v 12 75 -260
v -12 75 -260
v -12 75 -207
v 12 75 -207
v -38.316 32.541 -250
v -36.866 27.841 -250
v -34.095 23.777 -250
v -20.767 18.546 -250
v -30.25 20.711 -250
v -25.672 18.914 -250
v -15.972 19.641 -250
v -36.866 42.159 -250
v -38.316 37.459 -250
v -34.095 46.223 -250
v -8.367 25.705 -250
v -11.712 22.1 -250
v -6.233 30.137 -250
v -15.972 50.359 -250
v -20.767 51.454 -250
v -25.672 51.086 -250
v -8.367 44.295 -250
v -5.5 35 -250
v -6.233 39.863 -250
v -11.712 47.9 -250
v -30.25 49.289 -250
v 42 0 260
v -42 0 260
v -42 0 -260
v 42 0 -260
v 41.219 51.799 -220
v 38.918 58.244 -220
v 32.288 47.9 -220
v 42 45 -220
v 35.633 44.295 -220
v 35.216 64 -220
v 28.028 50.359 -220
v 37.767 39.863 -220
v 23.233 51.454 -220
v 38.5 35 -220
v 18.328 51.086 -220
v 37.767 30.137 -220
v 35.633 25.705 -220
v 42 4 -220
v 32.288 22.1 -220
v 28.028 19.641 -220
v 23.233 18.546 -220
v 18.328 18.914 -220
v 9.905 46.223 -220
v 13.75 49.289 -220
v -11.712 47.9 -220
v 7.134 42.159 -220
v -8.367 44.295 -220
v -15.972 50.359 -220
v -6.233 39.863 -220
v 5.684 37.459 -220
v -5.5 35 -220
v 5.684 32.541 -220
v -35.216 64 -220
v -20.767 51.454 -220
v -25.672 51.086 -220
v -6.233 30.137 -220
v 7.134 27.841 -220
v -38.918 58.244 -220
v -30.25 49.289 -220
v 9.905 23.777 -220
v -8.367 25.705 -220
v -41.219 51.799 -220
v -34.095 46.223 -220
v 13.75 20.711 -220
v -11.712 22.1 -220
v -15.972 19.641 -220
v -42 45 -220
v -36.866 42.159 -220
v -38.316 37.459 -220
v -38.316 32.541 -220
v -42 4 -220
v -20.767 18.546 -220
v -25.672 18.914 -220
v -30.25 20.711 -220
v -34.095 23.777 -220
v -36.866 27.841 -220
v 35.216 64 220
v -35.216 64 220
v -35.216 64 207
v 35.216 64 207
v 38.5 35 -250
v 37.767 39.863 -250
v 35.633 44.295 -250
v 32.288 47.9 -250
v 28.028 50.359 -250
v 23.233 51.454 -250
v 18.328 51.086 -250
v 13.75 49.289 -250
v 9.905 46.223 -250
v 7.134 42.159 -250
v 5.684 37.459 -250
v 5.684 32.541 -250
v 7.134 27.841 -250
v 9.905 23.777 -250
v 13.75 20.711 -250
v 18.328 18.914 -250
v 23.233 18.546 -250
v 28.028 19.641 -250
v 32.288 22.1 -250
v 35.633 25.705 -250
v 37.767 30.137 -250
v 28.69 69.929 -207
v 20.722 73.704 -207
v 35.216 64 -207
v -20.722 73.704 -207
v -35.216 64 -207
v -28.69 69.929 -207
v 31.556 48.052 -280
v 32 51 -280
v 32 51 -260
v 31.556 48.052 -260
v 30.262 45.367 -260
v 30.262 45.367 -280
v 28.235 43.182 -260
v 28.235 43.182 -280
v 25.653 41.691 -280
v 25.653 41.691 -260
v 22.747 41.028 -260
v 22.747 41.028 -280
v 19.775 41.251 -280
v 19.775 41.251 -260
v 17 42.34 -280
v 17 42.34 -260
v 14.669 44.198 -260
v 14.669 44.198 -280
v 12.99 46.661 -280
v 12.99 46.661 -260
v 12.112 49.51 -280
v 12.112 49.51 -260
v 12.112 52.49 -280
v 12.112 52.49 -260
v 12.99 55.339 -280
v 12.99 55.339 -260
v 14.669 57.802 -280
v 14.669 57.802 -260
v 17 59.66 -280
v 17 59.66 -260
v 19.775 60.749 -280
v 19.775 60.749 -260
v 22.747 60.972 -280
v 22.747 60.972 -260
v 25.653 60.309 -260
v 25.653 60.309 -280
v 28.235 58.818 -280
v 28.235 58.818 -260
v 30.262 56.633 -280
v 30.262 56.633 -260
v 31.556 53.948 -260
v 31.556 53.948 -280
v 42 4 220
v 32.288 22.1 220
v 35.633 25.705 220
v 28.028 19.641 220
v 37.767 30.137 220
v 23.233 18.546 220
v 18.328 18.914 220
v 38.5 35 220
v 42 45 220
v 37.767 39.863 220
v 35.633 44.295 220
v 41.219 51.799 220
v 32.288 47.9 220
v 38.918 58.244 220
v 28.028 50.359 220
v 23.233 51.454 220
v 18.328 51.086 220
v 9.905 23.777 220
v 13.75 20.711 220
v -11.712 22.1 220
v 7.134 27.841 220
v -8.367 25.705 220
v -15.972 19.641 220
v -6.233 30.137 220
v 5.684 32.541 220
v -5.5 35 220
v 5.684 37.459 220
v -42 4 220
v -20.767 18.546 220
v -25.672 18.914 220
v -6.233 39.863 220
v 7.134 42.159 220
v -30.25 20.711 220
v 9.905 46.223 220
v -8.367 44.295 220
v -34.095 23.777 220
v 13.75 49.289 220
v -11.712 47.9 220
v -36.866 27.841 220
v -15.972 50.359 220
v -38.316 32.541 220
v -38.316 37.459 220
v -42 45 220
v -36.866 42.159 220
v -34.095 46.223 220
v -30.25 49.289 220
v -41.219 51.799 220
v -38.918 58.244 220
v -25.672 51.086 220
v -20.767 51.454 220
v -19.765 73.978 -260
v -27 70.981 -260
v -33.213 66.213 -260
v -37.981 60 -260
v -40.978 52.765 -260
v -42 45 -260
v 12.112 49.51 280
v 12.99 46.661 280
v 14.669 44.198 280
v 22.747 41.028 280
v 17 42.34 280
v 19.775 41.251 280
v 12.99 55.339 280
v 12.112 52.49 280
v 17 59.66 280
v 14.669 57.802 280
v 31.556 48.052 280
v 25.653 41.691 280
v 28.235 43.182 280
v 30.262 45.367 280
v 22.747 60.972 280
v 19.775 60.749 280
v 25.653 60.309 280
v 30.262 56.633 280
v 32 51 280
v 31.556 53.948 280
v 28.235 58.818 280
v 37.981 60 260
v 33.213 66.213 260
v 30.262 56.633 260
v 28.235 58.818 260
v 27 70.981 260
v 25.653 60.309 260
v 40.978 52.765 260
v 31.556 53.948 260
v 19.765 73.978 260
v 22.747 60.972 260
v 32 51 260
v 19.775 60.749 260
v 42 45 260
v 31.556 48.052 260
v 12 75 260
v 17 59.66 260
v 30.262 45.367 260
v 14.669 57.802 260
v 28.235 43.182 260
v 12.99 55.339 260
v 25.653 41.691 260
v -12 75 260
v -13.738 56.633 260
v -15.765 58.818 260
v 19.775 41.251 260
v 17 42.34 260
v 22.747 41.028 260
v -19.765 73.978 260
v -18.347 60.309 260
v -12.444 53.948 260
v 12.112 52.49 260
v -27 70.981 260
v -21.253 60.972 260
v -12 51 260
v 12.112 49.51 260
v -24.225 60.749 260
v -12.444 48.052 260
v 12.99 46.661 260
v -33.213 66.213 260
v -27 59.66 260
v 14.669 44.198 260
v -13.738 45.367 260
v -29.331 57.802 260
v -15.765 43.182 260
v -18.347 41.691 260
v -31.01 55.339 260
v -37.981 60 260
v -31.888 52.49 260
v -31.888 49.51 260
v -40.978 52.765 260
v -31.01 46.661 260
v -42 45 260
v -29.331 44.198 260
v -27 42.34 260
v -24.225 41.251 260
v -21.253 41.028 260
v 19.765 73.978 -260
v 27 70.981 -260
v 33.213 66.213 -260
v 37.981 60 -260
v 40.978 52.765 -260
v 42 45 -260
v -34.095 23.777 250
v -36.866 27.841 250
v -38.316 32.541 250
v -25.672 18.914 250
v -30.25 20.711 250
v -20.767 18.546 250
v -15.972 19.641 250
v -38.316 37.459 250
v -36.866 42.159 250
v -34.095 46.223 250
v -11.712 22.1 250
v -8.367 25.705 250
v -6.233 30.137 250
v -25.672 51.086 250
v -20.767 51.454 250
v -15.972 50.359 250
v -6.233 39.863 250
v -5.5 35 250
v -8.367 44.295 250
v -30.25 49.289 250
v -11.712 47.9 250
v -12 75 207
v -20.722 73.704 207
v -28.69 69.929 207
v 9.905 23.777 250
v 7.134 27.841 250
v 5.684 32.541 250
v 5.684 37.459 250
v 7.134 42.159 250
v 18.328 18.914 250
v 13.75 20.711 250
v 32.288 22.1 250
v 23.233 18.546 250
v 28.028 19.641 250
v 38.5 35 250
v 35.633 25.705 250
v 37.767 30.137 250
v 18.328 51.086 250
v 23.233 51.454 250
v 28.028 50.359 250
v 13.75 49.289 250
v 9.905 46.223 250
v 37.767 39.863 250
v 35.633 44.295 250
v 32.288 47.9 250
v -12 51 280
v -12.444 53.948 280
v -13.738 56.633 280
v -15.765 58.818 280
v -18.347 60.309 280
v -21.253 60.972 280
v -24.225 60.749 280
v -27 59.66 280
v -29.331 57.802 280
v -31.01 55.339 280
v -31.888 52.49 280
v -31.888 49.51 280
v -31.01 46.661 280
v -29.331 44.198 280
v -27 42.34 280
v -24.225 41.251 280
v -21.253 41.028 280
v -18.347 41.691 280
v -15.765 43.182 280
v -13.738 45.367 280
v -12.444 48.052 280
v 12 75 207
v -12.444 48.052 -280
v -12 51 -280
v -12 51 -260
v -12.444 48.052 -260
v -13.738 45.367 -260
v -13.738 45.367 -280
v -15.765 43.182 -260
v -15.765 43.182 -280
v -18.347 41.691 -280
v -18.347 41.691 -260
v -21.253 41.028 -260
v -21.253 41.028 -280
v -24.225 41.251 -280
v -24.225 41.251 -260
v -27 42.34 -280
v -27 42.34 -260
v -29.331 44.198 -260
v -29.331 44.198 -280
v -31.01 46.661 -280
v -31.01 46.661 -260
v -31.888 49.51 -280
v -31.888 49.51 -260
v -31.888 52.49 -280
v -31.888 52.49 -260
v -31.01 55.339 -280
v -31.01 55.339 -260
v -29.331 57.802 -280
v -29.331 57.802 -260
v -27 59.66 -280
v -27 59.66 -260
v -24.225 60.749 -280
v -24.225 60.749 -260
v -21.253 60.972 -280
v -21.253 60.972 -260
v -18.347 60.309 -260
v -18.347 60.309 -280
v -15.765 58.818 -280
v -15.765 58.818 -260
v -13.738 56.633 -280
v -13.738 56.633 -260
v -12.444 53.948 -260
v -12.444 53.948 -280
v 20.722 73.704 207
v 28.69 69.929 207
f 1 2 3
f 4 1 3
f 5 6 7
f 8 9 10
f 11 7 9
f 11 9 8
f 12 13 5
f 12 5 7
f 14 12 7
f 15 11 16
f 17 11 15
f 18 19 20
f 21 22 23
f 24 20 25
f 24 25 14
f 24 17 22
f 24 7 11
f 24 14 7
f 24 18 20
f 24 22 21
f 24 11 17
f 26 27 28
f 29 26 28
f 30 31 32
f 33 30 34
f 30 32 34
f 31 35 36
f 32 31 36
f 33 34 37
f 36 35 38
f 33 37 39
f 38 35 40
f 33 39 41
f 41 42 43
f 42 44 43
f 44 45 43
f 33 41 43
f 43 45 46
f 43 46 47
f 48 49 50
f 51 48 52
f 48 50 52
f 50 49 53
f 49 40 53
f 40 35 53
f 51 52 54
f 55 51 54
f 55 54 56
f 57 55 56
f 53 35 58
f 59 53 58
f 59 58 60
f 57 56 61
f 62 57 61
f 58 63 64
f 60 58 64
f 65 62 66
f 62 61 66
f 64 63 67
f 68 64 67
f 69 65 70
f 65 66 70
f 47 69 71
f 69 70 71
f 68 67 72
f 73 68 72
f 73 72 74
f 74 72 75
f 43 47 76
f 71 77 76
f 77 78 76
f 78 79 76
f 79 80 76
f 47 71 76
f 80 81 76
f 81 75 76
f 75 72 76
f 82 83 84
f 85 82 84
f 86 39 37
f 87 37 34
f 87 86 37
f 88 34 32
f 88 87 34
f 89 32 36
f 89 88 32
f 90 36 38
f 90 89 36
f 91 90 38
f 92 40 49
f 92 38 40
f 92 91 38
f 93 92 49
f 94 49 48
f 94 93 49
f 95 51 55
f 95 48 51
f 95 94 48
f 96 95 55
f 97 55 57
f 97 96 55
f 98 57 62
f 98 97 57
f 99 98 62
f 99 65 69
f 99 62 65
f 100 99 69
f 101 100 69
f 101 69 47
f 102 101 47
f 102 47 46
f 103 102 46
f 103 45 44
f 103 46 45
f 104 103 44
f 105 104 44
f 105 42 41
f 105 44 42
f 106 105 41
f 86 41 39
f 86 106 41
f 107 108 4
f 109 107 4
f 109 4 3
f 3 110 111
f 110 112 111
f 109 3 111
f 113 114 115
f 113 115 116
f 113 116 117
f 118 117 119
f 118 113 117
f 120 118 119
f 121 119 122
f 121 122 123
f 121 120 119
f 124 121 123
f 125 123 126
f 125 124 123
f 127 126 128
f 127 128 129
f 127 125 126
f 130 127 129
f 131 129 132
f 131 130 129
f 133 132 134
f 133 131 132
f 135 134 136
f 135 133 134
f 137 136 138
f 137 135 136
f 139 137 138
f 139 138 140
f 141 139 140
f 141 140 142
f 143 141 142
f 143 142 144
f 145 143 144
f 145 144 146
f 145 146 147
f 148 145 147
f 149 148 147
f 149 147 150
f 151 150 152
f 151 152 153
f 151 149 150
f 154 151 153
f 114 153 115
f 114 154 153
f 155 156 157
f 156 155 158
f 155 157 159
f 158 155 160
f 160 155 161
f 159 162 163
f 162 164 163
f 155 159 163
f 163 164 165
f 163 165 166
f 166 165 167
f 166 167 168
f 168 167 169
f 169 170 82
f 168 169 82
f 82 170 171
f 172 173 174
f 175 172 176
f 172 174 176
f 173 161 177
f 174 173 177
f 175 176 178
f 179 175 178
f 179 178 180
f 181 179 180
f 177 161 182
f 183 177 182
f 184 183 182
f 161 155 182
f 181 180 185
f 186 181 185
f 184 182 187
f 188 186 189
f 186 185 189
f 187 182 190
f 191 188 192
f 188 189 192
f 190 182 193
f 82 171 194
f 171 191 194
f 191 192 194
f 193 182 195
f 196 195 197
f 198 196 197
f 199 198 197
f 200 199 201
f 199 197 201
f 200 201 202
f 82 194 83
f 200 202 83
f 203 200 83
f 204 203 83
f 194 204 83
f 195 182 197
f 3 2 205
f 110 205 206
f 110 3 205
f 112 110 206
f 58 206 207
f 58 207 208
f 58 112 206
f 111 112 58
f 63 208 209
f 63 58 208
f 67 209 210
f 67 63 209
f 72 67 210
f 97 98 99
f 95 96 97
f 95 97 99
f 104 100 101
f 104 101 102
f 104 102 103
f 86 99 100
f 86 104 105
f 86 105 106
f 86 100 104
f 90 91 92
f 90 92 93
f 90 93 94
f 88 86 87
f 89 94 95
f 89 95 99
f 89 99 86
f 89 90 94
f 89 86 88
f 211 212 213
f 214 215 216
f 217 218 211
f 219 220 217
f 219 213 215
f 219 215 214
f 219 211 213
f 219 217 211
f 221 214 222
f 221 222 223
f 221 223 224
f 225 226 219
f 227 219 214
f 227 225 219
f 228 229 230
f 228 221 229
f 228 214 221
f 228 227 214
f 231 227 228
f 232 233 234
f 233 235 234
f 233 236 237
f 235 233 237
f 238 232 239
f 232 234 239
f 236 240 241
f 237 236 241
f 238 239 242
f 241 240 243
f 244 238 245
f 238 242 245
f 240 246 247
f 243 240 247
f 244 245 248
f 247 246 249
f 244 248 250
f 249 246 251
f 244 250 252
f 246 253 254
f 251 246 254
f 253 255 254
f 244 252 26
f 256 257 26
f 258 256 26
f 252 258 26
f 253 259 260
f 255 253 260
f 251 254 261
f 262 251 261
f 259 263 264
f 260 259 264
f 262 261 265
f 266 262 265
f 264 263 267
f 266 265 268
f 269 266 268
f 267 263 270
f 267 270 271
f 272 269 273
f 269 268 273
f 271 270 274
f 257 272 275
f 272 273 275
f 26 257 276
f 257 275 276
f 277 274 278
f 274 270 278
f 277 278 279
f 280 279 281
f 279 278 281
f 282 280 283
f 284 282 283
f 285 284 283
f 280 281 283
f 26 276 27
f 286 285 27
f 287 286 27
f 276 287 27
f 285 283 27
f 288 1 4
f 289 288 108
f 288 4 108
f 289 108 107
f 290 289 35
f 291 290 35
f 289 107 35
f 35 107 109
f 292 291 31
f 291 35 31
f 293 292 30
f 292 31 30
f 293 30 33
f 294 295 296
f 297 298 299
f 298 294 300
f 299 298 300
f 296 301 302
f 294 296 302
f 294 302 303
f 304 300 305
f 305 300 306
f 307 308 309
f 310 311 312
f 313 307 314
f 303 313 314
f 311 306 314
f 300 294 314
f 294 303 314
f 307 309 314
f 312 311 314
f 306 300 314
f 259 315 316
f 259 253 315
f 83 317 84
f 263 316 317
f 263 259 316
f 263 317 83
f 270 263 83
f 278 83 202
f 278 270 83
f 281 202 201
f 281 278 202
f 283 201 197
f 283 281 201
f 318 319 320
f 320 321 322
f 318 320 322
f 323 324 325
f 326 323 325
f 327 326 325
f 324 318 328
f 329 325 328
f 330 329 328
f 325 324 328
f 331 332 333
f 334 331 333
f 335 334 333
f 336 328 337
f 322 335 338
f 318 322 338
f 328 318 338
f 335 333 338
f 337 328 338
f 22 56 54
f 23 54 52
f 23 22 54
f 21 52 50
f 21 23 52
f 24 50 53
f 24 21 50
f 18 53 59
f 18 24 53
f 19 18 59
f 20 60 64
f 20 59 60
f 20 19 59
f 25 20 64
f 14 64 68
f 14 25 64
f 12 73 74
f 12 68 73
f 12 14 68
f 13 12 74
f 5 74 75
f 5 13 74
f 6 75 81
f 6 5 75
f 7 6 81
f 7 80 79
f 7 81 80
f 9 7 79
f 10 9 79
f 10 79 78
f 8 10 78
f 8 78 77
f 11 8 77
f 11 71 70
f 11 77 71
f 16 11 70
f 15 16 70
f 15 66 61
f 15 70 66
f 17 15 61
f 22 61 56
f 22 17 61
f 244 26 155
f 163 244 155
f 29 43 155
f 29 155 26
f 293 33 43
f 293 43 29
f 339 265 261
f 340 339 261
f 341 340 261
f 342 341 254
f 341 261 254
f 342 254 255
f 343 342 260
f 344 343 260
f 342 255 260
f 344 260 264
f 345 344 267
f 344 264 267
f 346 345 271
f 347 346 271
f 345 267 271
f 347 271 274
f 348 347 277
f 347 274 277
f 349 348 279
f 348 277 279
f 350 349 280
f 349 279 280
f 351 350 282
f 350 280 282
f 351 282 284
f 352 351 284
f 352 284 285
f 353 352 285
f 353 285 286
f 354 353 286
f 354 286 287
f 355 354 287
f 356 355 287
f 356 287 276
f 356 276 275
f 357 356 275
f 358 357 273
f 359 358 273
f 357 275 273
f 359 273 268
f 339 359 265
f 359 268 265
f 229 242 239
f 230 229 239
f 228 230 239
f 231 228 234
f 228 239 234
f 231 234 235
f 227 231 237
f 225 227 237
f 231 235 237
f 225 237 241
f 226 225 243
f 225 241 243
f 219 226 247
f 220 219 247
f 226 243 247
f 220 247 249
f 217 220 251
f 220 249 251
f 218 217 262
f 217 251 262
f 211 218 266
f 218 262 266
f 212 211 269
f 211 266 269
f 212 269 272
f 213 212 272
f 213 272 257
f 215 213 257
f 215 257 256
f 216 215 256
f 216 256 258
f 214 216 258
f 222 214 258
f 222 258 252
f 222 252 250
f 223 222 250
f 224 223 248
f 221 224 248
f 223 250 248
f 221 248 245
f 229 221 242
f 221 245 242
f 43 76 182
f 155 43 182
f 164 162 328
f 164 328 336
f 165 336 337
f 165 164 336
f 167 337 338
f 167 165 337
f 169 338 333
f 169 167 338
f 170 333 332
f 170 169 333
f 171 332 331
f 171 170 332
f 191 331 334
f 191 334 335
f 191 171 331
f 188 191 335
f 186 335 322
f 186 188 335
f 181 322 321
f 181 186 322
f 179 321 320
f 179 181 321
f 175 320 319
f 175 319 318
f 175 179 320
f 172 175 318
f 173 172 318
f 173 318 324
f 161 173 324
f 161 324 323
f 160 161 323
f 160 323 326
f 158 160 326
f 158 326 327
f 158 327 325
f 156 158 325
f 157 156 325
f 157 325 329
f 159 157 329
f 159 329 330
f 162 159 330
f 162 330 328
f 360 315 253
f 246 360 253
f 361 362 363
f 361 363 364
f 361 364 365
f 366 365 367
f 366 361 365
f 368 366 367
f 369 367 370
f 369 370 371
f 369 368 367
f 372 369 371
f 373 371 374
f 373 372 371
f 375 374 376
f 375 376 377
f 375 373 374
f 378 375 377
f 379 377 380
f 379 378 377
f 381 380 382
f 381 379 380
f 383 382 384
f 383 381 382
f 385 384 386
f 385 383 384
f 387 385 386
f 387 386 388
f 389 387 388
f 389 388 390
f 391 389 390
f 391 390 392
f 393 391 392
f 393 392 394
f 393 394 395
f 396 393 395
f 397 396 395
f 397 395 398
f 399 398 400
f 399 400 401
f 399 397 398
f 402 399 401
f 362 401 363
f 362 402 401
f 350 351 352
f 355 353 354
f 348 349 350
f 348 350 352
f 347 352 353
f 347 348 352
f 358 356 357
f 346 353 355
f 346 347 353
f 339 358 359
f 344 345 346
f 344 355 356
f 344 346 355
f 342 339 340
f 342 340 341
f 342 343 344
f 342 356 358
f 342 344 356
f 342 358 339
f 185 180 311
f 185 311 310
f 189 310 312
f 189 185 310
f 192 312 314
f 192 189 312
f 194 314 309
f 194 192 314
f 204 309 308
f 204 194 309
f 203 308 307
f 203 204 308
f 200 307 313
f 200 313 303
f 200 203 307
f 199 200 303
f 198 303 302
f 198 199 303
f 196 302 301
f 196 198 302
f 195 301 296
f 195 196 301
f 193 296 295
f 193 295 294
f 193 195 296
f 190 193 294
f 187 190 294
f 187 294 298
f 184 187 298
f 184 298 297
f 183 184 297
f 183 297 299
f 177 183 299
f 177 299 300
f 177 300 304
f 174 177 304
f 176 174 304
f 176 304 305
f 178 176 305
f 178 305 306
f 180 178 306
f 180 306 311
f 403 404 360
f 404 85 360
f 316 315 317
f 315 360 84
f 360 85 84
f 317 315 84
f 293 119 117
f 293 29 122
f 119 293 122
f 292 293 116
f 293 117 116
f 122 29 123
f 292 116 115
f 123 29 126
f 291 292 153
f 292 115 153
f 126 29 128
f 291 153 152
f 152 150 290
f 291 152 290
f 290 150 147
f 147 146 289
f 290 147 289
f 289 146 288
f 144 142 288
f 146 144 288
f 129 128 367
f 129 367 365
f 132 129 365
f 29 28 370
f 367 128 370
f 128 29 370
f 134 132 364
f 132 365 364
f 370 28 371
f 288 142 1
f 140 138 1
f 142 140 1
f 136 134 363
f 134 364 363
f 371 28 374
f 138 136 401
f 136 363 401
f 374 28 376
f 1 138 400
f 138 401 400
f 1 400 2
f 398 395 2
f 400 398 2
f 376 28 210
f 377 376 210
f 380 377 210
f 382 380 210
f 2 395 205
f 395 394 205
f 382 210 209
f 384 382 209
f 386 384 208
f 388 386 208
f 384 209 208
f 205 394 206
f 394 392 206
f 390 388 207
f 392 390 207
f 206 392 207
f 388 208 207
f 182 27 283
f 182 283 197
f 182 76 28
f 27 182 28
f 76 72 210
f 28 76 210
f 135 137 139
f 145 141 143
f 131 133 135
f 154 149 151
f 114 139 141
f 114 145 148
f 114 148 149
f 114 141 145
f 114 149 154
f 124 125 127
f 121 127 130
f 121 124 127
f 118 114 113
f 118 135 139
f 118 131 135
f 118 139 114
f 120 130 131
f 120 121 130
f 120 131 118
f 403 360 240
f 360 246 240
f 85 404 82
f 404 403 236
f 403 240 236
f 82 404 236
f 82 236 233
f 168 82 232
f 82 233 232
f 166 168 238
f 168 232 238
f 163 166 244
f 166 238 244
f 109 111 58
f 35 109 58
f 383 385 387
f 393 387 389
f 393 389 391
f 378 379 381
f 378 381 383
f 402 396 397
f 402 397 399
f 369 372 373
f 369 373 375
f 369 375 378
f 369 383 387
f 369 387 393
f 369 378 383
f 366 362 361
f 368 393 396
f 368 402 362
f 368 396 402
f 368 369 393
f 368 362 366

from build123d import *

# Parameters (mm, degrees)
BOSS_EXTRUDE1_DEPTH      = 42
BOSS_EXTRUDE1_DEPTH_BACK = 42
FILLET1_R                = 30
CUT_EXTRUDE1_DEPTH       = 250
CUT_EXTRUDE1_DEPTH_BACK  = 250
SKETCH2_R                = 16.5
SKETCH3_R                = 10
BOSS_EXTRUDE2_DEPTH      = 20
BOSS_EXTRUDE3_START      = 20
SKETCH4_R                = 10
BOSS_EXTRUDE3_DEPTH      = 20


with BuildPart() as part:
    # Sketch1 → Boss-Extrude1 (new, two sides: drawn at the far end of the back side and taken through both)
    with BuildSketch(Plane(origin=(0, 0, 0), x_dir=(0, 0, -1), z_dir=(1, 0, 0)).offset(-BOSS_EXTRUDE1_DEPTH_BACK)):
        Polygon((-260, 0), (260, 0), (260, 75), (207, 75), (207, 64), (220, 64), (220, 4), (-220, 4), (-220, 64), (-207, 64), (-207, 75), (-260, 75), align=None)
    extrude(amount=BOSS_EXTRUDE1_DEPTH + BOSS_EXTRUDE1_DEPTH_BACK)

    # Fillet1
    fillet1_edges = [part.edges().sort_by_distance(p)[0] for p in [
        (-42, 75, -233.5),
        (42, 75, -233.5),
        (-42, 75, 233.5),
        (42, 75, 233.5),
    ]]
    fillet(fillet1_edges, radius=FILLET1_R)

    # Sketch2 → Cut-Extrude1 (cut, two sides: drawn at the far end of the back side and taken through both)
    with BuildSketch(Plane.XY.offset(-CUT_EXTRUDE1_DEPTH_BACK)):
        with Locations((22, 35)):
            Circle(SKETCH2_R)
        with Locations((-22, 35)):
            Circle(SKETCH2_R)
    extrude(amount=CUT_EXTRUDE1_DEPTH + CUT_EXTRUDE1_DEPTH_BACK, mode=Mode.SUBTRACT)

    # Sketch3 → Boss-Extrude2 (add)
    with BuildSketch(Plane.XY.offset(260)):
        with Locations((22, 51)):
            Circle(SKETCH3_R)
        with Locations((-22, 51)):
            Circle(SKETCH3_R)
    extrude(amount=BOSS_EXTRUDE2_DEPTH)

    # Sketch4 → Boss-Extrude3 (add)
    with BuildSketch(Plane(origin=(0, 0, -260), x_dir=(-1, 0, 0), z_dir=(0, 0, -1)).offset(BOSS_EXTRUDE3_START)):
        with Locations((22, 51)):
            Circle(SKETCH4_R)
        with Locations((-22, 51)):
            Circle(SKETCH4_R)
    extrude(amount=-BOSS_EXTRUDE3_DEPTH)


solid = part.part
